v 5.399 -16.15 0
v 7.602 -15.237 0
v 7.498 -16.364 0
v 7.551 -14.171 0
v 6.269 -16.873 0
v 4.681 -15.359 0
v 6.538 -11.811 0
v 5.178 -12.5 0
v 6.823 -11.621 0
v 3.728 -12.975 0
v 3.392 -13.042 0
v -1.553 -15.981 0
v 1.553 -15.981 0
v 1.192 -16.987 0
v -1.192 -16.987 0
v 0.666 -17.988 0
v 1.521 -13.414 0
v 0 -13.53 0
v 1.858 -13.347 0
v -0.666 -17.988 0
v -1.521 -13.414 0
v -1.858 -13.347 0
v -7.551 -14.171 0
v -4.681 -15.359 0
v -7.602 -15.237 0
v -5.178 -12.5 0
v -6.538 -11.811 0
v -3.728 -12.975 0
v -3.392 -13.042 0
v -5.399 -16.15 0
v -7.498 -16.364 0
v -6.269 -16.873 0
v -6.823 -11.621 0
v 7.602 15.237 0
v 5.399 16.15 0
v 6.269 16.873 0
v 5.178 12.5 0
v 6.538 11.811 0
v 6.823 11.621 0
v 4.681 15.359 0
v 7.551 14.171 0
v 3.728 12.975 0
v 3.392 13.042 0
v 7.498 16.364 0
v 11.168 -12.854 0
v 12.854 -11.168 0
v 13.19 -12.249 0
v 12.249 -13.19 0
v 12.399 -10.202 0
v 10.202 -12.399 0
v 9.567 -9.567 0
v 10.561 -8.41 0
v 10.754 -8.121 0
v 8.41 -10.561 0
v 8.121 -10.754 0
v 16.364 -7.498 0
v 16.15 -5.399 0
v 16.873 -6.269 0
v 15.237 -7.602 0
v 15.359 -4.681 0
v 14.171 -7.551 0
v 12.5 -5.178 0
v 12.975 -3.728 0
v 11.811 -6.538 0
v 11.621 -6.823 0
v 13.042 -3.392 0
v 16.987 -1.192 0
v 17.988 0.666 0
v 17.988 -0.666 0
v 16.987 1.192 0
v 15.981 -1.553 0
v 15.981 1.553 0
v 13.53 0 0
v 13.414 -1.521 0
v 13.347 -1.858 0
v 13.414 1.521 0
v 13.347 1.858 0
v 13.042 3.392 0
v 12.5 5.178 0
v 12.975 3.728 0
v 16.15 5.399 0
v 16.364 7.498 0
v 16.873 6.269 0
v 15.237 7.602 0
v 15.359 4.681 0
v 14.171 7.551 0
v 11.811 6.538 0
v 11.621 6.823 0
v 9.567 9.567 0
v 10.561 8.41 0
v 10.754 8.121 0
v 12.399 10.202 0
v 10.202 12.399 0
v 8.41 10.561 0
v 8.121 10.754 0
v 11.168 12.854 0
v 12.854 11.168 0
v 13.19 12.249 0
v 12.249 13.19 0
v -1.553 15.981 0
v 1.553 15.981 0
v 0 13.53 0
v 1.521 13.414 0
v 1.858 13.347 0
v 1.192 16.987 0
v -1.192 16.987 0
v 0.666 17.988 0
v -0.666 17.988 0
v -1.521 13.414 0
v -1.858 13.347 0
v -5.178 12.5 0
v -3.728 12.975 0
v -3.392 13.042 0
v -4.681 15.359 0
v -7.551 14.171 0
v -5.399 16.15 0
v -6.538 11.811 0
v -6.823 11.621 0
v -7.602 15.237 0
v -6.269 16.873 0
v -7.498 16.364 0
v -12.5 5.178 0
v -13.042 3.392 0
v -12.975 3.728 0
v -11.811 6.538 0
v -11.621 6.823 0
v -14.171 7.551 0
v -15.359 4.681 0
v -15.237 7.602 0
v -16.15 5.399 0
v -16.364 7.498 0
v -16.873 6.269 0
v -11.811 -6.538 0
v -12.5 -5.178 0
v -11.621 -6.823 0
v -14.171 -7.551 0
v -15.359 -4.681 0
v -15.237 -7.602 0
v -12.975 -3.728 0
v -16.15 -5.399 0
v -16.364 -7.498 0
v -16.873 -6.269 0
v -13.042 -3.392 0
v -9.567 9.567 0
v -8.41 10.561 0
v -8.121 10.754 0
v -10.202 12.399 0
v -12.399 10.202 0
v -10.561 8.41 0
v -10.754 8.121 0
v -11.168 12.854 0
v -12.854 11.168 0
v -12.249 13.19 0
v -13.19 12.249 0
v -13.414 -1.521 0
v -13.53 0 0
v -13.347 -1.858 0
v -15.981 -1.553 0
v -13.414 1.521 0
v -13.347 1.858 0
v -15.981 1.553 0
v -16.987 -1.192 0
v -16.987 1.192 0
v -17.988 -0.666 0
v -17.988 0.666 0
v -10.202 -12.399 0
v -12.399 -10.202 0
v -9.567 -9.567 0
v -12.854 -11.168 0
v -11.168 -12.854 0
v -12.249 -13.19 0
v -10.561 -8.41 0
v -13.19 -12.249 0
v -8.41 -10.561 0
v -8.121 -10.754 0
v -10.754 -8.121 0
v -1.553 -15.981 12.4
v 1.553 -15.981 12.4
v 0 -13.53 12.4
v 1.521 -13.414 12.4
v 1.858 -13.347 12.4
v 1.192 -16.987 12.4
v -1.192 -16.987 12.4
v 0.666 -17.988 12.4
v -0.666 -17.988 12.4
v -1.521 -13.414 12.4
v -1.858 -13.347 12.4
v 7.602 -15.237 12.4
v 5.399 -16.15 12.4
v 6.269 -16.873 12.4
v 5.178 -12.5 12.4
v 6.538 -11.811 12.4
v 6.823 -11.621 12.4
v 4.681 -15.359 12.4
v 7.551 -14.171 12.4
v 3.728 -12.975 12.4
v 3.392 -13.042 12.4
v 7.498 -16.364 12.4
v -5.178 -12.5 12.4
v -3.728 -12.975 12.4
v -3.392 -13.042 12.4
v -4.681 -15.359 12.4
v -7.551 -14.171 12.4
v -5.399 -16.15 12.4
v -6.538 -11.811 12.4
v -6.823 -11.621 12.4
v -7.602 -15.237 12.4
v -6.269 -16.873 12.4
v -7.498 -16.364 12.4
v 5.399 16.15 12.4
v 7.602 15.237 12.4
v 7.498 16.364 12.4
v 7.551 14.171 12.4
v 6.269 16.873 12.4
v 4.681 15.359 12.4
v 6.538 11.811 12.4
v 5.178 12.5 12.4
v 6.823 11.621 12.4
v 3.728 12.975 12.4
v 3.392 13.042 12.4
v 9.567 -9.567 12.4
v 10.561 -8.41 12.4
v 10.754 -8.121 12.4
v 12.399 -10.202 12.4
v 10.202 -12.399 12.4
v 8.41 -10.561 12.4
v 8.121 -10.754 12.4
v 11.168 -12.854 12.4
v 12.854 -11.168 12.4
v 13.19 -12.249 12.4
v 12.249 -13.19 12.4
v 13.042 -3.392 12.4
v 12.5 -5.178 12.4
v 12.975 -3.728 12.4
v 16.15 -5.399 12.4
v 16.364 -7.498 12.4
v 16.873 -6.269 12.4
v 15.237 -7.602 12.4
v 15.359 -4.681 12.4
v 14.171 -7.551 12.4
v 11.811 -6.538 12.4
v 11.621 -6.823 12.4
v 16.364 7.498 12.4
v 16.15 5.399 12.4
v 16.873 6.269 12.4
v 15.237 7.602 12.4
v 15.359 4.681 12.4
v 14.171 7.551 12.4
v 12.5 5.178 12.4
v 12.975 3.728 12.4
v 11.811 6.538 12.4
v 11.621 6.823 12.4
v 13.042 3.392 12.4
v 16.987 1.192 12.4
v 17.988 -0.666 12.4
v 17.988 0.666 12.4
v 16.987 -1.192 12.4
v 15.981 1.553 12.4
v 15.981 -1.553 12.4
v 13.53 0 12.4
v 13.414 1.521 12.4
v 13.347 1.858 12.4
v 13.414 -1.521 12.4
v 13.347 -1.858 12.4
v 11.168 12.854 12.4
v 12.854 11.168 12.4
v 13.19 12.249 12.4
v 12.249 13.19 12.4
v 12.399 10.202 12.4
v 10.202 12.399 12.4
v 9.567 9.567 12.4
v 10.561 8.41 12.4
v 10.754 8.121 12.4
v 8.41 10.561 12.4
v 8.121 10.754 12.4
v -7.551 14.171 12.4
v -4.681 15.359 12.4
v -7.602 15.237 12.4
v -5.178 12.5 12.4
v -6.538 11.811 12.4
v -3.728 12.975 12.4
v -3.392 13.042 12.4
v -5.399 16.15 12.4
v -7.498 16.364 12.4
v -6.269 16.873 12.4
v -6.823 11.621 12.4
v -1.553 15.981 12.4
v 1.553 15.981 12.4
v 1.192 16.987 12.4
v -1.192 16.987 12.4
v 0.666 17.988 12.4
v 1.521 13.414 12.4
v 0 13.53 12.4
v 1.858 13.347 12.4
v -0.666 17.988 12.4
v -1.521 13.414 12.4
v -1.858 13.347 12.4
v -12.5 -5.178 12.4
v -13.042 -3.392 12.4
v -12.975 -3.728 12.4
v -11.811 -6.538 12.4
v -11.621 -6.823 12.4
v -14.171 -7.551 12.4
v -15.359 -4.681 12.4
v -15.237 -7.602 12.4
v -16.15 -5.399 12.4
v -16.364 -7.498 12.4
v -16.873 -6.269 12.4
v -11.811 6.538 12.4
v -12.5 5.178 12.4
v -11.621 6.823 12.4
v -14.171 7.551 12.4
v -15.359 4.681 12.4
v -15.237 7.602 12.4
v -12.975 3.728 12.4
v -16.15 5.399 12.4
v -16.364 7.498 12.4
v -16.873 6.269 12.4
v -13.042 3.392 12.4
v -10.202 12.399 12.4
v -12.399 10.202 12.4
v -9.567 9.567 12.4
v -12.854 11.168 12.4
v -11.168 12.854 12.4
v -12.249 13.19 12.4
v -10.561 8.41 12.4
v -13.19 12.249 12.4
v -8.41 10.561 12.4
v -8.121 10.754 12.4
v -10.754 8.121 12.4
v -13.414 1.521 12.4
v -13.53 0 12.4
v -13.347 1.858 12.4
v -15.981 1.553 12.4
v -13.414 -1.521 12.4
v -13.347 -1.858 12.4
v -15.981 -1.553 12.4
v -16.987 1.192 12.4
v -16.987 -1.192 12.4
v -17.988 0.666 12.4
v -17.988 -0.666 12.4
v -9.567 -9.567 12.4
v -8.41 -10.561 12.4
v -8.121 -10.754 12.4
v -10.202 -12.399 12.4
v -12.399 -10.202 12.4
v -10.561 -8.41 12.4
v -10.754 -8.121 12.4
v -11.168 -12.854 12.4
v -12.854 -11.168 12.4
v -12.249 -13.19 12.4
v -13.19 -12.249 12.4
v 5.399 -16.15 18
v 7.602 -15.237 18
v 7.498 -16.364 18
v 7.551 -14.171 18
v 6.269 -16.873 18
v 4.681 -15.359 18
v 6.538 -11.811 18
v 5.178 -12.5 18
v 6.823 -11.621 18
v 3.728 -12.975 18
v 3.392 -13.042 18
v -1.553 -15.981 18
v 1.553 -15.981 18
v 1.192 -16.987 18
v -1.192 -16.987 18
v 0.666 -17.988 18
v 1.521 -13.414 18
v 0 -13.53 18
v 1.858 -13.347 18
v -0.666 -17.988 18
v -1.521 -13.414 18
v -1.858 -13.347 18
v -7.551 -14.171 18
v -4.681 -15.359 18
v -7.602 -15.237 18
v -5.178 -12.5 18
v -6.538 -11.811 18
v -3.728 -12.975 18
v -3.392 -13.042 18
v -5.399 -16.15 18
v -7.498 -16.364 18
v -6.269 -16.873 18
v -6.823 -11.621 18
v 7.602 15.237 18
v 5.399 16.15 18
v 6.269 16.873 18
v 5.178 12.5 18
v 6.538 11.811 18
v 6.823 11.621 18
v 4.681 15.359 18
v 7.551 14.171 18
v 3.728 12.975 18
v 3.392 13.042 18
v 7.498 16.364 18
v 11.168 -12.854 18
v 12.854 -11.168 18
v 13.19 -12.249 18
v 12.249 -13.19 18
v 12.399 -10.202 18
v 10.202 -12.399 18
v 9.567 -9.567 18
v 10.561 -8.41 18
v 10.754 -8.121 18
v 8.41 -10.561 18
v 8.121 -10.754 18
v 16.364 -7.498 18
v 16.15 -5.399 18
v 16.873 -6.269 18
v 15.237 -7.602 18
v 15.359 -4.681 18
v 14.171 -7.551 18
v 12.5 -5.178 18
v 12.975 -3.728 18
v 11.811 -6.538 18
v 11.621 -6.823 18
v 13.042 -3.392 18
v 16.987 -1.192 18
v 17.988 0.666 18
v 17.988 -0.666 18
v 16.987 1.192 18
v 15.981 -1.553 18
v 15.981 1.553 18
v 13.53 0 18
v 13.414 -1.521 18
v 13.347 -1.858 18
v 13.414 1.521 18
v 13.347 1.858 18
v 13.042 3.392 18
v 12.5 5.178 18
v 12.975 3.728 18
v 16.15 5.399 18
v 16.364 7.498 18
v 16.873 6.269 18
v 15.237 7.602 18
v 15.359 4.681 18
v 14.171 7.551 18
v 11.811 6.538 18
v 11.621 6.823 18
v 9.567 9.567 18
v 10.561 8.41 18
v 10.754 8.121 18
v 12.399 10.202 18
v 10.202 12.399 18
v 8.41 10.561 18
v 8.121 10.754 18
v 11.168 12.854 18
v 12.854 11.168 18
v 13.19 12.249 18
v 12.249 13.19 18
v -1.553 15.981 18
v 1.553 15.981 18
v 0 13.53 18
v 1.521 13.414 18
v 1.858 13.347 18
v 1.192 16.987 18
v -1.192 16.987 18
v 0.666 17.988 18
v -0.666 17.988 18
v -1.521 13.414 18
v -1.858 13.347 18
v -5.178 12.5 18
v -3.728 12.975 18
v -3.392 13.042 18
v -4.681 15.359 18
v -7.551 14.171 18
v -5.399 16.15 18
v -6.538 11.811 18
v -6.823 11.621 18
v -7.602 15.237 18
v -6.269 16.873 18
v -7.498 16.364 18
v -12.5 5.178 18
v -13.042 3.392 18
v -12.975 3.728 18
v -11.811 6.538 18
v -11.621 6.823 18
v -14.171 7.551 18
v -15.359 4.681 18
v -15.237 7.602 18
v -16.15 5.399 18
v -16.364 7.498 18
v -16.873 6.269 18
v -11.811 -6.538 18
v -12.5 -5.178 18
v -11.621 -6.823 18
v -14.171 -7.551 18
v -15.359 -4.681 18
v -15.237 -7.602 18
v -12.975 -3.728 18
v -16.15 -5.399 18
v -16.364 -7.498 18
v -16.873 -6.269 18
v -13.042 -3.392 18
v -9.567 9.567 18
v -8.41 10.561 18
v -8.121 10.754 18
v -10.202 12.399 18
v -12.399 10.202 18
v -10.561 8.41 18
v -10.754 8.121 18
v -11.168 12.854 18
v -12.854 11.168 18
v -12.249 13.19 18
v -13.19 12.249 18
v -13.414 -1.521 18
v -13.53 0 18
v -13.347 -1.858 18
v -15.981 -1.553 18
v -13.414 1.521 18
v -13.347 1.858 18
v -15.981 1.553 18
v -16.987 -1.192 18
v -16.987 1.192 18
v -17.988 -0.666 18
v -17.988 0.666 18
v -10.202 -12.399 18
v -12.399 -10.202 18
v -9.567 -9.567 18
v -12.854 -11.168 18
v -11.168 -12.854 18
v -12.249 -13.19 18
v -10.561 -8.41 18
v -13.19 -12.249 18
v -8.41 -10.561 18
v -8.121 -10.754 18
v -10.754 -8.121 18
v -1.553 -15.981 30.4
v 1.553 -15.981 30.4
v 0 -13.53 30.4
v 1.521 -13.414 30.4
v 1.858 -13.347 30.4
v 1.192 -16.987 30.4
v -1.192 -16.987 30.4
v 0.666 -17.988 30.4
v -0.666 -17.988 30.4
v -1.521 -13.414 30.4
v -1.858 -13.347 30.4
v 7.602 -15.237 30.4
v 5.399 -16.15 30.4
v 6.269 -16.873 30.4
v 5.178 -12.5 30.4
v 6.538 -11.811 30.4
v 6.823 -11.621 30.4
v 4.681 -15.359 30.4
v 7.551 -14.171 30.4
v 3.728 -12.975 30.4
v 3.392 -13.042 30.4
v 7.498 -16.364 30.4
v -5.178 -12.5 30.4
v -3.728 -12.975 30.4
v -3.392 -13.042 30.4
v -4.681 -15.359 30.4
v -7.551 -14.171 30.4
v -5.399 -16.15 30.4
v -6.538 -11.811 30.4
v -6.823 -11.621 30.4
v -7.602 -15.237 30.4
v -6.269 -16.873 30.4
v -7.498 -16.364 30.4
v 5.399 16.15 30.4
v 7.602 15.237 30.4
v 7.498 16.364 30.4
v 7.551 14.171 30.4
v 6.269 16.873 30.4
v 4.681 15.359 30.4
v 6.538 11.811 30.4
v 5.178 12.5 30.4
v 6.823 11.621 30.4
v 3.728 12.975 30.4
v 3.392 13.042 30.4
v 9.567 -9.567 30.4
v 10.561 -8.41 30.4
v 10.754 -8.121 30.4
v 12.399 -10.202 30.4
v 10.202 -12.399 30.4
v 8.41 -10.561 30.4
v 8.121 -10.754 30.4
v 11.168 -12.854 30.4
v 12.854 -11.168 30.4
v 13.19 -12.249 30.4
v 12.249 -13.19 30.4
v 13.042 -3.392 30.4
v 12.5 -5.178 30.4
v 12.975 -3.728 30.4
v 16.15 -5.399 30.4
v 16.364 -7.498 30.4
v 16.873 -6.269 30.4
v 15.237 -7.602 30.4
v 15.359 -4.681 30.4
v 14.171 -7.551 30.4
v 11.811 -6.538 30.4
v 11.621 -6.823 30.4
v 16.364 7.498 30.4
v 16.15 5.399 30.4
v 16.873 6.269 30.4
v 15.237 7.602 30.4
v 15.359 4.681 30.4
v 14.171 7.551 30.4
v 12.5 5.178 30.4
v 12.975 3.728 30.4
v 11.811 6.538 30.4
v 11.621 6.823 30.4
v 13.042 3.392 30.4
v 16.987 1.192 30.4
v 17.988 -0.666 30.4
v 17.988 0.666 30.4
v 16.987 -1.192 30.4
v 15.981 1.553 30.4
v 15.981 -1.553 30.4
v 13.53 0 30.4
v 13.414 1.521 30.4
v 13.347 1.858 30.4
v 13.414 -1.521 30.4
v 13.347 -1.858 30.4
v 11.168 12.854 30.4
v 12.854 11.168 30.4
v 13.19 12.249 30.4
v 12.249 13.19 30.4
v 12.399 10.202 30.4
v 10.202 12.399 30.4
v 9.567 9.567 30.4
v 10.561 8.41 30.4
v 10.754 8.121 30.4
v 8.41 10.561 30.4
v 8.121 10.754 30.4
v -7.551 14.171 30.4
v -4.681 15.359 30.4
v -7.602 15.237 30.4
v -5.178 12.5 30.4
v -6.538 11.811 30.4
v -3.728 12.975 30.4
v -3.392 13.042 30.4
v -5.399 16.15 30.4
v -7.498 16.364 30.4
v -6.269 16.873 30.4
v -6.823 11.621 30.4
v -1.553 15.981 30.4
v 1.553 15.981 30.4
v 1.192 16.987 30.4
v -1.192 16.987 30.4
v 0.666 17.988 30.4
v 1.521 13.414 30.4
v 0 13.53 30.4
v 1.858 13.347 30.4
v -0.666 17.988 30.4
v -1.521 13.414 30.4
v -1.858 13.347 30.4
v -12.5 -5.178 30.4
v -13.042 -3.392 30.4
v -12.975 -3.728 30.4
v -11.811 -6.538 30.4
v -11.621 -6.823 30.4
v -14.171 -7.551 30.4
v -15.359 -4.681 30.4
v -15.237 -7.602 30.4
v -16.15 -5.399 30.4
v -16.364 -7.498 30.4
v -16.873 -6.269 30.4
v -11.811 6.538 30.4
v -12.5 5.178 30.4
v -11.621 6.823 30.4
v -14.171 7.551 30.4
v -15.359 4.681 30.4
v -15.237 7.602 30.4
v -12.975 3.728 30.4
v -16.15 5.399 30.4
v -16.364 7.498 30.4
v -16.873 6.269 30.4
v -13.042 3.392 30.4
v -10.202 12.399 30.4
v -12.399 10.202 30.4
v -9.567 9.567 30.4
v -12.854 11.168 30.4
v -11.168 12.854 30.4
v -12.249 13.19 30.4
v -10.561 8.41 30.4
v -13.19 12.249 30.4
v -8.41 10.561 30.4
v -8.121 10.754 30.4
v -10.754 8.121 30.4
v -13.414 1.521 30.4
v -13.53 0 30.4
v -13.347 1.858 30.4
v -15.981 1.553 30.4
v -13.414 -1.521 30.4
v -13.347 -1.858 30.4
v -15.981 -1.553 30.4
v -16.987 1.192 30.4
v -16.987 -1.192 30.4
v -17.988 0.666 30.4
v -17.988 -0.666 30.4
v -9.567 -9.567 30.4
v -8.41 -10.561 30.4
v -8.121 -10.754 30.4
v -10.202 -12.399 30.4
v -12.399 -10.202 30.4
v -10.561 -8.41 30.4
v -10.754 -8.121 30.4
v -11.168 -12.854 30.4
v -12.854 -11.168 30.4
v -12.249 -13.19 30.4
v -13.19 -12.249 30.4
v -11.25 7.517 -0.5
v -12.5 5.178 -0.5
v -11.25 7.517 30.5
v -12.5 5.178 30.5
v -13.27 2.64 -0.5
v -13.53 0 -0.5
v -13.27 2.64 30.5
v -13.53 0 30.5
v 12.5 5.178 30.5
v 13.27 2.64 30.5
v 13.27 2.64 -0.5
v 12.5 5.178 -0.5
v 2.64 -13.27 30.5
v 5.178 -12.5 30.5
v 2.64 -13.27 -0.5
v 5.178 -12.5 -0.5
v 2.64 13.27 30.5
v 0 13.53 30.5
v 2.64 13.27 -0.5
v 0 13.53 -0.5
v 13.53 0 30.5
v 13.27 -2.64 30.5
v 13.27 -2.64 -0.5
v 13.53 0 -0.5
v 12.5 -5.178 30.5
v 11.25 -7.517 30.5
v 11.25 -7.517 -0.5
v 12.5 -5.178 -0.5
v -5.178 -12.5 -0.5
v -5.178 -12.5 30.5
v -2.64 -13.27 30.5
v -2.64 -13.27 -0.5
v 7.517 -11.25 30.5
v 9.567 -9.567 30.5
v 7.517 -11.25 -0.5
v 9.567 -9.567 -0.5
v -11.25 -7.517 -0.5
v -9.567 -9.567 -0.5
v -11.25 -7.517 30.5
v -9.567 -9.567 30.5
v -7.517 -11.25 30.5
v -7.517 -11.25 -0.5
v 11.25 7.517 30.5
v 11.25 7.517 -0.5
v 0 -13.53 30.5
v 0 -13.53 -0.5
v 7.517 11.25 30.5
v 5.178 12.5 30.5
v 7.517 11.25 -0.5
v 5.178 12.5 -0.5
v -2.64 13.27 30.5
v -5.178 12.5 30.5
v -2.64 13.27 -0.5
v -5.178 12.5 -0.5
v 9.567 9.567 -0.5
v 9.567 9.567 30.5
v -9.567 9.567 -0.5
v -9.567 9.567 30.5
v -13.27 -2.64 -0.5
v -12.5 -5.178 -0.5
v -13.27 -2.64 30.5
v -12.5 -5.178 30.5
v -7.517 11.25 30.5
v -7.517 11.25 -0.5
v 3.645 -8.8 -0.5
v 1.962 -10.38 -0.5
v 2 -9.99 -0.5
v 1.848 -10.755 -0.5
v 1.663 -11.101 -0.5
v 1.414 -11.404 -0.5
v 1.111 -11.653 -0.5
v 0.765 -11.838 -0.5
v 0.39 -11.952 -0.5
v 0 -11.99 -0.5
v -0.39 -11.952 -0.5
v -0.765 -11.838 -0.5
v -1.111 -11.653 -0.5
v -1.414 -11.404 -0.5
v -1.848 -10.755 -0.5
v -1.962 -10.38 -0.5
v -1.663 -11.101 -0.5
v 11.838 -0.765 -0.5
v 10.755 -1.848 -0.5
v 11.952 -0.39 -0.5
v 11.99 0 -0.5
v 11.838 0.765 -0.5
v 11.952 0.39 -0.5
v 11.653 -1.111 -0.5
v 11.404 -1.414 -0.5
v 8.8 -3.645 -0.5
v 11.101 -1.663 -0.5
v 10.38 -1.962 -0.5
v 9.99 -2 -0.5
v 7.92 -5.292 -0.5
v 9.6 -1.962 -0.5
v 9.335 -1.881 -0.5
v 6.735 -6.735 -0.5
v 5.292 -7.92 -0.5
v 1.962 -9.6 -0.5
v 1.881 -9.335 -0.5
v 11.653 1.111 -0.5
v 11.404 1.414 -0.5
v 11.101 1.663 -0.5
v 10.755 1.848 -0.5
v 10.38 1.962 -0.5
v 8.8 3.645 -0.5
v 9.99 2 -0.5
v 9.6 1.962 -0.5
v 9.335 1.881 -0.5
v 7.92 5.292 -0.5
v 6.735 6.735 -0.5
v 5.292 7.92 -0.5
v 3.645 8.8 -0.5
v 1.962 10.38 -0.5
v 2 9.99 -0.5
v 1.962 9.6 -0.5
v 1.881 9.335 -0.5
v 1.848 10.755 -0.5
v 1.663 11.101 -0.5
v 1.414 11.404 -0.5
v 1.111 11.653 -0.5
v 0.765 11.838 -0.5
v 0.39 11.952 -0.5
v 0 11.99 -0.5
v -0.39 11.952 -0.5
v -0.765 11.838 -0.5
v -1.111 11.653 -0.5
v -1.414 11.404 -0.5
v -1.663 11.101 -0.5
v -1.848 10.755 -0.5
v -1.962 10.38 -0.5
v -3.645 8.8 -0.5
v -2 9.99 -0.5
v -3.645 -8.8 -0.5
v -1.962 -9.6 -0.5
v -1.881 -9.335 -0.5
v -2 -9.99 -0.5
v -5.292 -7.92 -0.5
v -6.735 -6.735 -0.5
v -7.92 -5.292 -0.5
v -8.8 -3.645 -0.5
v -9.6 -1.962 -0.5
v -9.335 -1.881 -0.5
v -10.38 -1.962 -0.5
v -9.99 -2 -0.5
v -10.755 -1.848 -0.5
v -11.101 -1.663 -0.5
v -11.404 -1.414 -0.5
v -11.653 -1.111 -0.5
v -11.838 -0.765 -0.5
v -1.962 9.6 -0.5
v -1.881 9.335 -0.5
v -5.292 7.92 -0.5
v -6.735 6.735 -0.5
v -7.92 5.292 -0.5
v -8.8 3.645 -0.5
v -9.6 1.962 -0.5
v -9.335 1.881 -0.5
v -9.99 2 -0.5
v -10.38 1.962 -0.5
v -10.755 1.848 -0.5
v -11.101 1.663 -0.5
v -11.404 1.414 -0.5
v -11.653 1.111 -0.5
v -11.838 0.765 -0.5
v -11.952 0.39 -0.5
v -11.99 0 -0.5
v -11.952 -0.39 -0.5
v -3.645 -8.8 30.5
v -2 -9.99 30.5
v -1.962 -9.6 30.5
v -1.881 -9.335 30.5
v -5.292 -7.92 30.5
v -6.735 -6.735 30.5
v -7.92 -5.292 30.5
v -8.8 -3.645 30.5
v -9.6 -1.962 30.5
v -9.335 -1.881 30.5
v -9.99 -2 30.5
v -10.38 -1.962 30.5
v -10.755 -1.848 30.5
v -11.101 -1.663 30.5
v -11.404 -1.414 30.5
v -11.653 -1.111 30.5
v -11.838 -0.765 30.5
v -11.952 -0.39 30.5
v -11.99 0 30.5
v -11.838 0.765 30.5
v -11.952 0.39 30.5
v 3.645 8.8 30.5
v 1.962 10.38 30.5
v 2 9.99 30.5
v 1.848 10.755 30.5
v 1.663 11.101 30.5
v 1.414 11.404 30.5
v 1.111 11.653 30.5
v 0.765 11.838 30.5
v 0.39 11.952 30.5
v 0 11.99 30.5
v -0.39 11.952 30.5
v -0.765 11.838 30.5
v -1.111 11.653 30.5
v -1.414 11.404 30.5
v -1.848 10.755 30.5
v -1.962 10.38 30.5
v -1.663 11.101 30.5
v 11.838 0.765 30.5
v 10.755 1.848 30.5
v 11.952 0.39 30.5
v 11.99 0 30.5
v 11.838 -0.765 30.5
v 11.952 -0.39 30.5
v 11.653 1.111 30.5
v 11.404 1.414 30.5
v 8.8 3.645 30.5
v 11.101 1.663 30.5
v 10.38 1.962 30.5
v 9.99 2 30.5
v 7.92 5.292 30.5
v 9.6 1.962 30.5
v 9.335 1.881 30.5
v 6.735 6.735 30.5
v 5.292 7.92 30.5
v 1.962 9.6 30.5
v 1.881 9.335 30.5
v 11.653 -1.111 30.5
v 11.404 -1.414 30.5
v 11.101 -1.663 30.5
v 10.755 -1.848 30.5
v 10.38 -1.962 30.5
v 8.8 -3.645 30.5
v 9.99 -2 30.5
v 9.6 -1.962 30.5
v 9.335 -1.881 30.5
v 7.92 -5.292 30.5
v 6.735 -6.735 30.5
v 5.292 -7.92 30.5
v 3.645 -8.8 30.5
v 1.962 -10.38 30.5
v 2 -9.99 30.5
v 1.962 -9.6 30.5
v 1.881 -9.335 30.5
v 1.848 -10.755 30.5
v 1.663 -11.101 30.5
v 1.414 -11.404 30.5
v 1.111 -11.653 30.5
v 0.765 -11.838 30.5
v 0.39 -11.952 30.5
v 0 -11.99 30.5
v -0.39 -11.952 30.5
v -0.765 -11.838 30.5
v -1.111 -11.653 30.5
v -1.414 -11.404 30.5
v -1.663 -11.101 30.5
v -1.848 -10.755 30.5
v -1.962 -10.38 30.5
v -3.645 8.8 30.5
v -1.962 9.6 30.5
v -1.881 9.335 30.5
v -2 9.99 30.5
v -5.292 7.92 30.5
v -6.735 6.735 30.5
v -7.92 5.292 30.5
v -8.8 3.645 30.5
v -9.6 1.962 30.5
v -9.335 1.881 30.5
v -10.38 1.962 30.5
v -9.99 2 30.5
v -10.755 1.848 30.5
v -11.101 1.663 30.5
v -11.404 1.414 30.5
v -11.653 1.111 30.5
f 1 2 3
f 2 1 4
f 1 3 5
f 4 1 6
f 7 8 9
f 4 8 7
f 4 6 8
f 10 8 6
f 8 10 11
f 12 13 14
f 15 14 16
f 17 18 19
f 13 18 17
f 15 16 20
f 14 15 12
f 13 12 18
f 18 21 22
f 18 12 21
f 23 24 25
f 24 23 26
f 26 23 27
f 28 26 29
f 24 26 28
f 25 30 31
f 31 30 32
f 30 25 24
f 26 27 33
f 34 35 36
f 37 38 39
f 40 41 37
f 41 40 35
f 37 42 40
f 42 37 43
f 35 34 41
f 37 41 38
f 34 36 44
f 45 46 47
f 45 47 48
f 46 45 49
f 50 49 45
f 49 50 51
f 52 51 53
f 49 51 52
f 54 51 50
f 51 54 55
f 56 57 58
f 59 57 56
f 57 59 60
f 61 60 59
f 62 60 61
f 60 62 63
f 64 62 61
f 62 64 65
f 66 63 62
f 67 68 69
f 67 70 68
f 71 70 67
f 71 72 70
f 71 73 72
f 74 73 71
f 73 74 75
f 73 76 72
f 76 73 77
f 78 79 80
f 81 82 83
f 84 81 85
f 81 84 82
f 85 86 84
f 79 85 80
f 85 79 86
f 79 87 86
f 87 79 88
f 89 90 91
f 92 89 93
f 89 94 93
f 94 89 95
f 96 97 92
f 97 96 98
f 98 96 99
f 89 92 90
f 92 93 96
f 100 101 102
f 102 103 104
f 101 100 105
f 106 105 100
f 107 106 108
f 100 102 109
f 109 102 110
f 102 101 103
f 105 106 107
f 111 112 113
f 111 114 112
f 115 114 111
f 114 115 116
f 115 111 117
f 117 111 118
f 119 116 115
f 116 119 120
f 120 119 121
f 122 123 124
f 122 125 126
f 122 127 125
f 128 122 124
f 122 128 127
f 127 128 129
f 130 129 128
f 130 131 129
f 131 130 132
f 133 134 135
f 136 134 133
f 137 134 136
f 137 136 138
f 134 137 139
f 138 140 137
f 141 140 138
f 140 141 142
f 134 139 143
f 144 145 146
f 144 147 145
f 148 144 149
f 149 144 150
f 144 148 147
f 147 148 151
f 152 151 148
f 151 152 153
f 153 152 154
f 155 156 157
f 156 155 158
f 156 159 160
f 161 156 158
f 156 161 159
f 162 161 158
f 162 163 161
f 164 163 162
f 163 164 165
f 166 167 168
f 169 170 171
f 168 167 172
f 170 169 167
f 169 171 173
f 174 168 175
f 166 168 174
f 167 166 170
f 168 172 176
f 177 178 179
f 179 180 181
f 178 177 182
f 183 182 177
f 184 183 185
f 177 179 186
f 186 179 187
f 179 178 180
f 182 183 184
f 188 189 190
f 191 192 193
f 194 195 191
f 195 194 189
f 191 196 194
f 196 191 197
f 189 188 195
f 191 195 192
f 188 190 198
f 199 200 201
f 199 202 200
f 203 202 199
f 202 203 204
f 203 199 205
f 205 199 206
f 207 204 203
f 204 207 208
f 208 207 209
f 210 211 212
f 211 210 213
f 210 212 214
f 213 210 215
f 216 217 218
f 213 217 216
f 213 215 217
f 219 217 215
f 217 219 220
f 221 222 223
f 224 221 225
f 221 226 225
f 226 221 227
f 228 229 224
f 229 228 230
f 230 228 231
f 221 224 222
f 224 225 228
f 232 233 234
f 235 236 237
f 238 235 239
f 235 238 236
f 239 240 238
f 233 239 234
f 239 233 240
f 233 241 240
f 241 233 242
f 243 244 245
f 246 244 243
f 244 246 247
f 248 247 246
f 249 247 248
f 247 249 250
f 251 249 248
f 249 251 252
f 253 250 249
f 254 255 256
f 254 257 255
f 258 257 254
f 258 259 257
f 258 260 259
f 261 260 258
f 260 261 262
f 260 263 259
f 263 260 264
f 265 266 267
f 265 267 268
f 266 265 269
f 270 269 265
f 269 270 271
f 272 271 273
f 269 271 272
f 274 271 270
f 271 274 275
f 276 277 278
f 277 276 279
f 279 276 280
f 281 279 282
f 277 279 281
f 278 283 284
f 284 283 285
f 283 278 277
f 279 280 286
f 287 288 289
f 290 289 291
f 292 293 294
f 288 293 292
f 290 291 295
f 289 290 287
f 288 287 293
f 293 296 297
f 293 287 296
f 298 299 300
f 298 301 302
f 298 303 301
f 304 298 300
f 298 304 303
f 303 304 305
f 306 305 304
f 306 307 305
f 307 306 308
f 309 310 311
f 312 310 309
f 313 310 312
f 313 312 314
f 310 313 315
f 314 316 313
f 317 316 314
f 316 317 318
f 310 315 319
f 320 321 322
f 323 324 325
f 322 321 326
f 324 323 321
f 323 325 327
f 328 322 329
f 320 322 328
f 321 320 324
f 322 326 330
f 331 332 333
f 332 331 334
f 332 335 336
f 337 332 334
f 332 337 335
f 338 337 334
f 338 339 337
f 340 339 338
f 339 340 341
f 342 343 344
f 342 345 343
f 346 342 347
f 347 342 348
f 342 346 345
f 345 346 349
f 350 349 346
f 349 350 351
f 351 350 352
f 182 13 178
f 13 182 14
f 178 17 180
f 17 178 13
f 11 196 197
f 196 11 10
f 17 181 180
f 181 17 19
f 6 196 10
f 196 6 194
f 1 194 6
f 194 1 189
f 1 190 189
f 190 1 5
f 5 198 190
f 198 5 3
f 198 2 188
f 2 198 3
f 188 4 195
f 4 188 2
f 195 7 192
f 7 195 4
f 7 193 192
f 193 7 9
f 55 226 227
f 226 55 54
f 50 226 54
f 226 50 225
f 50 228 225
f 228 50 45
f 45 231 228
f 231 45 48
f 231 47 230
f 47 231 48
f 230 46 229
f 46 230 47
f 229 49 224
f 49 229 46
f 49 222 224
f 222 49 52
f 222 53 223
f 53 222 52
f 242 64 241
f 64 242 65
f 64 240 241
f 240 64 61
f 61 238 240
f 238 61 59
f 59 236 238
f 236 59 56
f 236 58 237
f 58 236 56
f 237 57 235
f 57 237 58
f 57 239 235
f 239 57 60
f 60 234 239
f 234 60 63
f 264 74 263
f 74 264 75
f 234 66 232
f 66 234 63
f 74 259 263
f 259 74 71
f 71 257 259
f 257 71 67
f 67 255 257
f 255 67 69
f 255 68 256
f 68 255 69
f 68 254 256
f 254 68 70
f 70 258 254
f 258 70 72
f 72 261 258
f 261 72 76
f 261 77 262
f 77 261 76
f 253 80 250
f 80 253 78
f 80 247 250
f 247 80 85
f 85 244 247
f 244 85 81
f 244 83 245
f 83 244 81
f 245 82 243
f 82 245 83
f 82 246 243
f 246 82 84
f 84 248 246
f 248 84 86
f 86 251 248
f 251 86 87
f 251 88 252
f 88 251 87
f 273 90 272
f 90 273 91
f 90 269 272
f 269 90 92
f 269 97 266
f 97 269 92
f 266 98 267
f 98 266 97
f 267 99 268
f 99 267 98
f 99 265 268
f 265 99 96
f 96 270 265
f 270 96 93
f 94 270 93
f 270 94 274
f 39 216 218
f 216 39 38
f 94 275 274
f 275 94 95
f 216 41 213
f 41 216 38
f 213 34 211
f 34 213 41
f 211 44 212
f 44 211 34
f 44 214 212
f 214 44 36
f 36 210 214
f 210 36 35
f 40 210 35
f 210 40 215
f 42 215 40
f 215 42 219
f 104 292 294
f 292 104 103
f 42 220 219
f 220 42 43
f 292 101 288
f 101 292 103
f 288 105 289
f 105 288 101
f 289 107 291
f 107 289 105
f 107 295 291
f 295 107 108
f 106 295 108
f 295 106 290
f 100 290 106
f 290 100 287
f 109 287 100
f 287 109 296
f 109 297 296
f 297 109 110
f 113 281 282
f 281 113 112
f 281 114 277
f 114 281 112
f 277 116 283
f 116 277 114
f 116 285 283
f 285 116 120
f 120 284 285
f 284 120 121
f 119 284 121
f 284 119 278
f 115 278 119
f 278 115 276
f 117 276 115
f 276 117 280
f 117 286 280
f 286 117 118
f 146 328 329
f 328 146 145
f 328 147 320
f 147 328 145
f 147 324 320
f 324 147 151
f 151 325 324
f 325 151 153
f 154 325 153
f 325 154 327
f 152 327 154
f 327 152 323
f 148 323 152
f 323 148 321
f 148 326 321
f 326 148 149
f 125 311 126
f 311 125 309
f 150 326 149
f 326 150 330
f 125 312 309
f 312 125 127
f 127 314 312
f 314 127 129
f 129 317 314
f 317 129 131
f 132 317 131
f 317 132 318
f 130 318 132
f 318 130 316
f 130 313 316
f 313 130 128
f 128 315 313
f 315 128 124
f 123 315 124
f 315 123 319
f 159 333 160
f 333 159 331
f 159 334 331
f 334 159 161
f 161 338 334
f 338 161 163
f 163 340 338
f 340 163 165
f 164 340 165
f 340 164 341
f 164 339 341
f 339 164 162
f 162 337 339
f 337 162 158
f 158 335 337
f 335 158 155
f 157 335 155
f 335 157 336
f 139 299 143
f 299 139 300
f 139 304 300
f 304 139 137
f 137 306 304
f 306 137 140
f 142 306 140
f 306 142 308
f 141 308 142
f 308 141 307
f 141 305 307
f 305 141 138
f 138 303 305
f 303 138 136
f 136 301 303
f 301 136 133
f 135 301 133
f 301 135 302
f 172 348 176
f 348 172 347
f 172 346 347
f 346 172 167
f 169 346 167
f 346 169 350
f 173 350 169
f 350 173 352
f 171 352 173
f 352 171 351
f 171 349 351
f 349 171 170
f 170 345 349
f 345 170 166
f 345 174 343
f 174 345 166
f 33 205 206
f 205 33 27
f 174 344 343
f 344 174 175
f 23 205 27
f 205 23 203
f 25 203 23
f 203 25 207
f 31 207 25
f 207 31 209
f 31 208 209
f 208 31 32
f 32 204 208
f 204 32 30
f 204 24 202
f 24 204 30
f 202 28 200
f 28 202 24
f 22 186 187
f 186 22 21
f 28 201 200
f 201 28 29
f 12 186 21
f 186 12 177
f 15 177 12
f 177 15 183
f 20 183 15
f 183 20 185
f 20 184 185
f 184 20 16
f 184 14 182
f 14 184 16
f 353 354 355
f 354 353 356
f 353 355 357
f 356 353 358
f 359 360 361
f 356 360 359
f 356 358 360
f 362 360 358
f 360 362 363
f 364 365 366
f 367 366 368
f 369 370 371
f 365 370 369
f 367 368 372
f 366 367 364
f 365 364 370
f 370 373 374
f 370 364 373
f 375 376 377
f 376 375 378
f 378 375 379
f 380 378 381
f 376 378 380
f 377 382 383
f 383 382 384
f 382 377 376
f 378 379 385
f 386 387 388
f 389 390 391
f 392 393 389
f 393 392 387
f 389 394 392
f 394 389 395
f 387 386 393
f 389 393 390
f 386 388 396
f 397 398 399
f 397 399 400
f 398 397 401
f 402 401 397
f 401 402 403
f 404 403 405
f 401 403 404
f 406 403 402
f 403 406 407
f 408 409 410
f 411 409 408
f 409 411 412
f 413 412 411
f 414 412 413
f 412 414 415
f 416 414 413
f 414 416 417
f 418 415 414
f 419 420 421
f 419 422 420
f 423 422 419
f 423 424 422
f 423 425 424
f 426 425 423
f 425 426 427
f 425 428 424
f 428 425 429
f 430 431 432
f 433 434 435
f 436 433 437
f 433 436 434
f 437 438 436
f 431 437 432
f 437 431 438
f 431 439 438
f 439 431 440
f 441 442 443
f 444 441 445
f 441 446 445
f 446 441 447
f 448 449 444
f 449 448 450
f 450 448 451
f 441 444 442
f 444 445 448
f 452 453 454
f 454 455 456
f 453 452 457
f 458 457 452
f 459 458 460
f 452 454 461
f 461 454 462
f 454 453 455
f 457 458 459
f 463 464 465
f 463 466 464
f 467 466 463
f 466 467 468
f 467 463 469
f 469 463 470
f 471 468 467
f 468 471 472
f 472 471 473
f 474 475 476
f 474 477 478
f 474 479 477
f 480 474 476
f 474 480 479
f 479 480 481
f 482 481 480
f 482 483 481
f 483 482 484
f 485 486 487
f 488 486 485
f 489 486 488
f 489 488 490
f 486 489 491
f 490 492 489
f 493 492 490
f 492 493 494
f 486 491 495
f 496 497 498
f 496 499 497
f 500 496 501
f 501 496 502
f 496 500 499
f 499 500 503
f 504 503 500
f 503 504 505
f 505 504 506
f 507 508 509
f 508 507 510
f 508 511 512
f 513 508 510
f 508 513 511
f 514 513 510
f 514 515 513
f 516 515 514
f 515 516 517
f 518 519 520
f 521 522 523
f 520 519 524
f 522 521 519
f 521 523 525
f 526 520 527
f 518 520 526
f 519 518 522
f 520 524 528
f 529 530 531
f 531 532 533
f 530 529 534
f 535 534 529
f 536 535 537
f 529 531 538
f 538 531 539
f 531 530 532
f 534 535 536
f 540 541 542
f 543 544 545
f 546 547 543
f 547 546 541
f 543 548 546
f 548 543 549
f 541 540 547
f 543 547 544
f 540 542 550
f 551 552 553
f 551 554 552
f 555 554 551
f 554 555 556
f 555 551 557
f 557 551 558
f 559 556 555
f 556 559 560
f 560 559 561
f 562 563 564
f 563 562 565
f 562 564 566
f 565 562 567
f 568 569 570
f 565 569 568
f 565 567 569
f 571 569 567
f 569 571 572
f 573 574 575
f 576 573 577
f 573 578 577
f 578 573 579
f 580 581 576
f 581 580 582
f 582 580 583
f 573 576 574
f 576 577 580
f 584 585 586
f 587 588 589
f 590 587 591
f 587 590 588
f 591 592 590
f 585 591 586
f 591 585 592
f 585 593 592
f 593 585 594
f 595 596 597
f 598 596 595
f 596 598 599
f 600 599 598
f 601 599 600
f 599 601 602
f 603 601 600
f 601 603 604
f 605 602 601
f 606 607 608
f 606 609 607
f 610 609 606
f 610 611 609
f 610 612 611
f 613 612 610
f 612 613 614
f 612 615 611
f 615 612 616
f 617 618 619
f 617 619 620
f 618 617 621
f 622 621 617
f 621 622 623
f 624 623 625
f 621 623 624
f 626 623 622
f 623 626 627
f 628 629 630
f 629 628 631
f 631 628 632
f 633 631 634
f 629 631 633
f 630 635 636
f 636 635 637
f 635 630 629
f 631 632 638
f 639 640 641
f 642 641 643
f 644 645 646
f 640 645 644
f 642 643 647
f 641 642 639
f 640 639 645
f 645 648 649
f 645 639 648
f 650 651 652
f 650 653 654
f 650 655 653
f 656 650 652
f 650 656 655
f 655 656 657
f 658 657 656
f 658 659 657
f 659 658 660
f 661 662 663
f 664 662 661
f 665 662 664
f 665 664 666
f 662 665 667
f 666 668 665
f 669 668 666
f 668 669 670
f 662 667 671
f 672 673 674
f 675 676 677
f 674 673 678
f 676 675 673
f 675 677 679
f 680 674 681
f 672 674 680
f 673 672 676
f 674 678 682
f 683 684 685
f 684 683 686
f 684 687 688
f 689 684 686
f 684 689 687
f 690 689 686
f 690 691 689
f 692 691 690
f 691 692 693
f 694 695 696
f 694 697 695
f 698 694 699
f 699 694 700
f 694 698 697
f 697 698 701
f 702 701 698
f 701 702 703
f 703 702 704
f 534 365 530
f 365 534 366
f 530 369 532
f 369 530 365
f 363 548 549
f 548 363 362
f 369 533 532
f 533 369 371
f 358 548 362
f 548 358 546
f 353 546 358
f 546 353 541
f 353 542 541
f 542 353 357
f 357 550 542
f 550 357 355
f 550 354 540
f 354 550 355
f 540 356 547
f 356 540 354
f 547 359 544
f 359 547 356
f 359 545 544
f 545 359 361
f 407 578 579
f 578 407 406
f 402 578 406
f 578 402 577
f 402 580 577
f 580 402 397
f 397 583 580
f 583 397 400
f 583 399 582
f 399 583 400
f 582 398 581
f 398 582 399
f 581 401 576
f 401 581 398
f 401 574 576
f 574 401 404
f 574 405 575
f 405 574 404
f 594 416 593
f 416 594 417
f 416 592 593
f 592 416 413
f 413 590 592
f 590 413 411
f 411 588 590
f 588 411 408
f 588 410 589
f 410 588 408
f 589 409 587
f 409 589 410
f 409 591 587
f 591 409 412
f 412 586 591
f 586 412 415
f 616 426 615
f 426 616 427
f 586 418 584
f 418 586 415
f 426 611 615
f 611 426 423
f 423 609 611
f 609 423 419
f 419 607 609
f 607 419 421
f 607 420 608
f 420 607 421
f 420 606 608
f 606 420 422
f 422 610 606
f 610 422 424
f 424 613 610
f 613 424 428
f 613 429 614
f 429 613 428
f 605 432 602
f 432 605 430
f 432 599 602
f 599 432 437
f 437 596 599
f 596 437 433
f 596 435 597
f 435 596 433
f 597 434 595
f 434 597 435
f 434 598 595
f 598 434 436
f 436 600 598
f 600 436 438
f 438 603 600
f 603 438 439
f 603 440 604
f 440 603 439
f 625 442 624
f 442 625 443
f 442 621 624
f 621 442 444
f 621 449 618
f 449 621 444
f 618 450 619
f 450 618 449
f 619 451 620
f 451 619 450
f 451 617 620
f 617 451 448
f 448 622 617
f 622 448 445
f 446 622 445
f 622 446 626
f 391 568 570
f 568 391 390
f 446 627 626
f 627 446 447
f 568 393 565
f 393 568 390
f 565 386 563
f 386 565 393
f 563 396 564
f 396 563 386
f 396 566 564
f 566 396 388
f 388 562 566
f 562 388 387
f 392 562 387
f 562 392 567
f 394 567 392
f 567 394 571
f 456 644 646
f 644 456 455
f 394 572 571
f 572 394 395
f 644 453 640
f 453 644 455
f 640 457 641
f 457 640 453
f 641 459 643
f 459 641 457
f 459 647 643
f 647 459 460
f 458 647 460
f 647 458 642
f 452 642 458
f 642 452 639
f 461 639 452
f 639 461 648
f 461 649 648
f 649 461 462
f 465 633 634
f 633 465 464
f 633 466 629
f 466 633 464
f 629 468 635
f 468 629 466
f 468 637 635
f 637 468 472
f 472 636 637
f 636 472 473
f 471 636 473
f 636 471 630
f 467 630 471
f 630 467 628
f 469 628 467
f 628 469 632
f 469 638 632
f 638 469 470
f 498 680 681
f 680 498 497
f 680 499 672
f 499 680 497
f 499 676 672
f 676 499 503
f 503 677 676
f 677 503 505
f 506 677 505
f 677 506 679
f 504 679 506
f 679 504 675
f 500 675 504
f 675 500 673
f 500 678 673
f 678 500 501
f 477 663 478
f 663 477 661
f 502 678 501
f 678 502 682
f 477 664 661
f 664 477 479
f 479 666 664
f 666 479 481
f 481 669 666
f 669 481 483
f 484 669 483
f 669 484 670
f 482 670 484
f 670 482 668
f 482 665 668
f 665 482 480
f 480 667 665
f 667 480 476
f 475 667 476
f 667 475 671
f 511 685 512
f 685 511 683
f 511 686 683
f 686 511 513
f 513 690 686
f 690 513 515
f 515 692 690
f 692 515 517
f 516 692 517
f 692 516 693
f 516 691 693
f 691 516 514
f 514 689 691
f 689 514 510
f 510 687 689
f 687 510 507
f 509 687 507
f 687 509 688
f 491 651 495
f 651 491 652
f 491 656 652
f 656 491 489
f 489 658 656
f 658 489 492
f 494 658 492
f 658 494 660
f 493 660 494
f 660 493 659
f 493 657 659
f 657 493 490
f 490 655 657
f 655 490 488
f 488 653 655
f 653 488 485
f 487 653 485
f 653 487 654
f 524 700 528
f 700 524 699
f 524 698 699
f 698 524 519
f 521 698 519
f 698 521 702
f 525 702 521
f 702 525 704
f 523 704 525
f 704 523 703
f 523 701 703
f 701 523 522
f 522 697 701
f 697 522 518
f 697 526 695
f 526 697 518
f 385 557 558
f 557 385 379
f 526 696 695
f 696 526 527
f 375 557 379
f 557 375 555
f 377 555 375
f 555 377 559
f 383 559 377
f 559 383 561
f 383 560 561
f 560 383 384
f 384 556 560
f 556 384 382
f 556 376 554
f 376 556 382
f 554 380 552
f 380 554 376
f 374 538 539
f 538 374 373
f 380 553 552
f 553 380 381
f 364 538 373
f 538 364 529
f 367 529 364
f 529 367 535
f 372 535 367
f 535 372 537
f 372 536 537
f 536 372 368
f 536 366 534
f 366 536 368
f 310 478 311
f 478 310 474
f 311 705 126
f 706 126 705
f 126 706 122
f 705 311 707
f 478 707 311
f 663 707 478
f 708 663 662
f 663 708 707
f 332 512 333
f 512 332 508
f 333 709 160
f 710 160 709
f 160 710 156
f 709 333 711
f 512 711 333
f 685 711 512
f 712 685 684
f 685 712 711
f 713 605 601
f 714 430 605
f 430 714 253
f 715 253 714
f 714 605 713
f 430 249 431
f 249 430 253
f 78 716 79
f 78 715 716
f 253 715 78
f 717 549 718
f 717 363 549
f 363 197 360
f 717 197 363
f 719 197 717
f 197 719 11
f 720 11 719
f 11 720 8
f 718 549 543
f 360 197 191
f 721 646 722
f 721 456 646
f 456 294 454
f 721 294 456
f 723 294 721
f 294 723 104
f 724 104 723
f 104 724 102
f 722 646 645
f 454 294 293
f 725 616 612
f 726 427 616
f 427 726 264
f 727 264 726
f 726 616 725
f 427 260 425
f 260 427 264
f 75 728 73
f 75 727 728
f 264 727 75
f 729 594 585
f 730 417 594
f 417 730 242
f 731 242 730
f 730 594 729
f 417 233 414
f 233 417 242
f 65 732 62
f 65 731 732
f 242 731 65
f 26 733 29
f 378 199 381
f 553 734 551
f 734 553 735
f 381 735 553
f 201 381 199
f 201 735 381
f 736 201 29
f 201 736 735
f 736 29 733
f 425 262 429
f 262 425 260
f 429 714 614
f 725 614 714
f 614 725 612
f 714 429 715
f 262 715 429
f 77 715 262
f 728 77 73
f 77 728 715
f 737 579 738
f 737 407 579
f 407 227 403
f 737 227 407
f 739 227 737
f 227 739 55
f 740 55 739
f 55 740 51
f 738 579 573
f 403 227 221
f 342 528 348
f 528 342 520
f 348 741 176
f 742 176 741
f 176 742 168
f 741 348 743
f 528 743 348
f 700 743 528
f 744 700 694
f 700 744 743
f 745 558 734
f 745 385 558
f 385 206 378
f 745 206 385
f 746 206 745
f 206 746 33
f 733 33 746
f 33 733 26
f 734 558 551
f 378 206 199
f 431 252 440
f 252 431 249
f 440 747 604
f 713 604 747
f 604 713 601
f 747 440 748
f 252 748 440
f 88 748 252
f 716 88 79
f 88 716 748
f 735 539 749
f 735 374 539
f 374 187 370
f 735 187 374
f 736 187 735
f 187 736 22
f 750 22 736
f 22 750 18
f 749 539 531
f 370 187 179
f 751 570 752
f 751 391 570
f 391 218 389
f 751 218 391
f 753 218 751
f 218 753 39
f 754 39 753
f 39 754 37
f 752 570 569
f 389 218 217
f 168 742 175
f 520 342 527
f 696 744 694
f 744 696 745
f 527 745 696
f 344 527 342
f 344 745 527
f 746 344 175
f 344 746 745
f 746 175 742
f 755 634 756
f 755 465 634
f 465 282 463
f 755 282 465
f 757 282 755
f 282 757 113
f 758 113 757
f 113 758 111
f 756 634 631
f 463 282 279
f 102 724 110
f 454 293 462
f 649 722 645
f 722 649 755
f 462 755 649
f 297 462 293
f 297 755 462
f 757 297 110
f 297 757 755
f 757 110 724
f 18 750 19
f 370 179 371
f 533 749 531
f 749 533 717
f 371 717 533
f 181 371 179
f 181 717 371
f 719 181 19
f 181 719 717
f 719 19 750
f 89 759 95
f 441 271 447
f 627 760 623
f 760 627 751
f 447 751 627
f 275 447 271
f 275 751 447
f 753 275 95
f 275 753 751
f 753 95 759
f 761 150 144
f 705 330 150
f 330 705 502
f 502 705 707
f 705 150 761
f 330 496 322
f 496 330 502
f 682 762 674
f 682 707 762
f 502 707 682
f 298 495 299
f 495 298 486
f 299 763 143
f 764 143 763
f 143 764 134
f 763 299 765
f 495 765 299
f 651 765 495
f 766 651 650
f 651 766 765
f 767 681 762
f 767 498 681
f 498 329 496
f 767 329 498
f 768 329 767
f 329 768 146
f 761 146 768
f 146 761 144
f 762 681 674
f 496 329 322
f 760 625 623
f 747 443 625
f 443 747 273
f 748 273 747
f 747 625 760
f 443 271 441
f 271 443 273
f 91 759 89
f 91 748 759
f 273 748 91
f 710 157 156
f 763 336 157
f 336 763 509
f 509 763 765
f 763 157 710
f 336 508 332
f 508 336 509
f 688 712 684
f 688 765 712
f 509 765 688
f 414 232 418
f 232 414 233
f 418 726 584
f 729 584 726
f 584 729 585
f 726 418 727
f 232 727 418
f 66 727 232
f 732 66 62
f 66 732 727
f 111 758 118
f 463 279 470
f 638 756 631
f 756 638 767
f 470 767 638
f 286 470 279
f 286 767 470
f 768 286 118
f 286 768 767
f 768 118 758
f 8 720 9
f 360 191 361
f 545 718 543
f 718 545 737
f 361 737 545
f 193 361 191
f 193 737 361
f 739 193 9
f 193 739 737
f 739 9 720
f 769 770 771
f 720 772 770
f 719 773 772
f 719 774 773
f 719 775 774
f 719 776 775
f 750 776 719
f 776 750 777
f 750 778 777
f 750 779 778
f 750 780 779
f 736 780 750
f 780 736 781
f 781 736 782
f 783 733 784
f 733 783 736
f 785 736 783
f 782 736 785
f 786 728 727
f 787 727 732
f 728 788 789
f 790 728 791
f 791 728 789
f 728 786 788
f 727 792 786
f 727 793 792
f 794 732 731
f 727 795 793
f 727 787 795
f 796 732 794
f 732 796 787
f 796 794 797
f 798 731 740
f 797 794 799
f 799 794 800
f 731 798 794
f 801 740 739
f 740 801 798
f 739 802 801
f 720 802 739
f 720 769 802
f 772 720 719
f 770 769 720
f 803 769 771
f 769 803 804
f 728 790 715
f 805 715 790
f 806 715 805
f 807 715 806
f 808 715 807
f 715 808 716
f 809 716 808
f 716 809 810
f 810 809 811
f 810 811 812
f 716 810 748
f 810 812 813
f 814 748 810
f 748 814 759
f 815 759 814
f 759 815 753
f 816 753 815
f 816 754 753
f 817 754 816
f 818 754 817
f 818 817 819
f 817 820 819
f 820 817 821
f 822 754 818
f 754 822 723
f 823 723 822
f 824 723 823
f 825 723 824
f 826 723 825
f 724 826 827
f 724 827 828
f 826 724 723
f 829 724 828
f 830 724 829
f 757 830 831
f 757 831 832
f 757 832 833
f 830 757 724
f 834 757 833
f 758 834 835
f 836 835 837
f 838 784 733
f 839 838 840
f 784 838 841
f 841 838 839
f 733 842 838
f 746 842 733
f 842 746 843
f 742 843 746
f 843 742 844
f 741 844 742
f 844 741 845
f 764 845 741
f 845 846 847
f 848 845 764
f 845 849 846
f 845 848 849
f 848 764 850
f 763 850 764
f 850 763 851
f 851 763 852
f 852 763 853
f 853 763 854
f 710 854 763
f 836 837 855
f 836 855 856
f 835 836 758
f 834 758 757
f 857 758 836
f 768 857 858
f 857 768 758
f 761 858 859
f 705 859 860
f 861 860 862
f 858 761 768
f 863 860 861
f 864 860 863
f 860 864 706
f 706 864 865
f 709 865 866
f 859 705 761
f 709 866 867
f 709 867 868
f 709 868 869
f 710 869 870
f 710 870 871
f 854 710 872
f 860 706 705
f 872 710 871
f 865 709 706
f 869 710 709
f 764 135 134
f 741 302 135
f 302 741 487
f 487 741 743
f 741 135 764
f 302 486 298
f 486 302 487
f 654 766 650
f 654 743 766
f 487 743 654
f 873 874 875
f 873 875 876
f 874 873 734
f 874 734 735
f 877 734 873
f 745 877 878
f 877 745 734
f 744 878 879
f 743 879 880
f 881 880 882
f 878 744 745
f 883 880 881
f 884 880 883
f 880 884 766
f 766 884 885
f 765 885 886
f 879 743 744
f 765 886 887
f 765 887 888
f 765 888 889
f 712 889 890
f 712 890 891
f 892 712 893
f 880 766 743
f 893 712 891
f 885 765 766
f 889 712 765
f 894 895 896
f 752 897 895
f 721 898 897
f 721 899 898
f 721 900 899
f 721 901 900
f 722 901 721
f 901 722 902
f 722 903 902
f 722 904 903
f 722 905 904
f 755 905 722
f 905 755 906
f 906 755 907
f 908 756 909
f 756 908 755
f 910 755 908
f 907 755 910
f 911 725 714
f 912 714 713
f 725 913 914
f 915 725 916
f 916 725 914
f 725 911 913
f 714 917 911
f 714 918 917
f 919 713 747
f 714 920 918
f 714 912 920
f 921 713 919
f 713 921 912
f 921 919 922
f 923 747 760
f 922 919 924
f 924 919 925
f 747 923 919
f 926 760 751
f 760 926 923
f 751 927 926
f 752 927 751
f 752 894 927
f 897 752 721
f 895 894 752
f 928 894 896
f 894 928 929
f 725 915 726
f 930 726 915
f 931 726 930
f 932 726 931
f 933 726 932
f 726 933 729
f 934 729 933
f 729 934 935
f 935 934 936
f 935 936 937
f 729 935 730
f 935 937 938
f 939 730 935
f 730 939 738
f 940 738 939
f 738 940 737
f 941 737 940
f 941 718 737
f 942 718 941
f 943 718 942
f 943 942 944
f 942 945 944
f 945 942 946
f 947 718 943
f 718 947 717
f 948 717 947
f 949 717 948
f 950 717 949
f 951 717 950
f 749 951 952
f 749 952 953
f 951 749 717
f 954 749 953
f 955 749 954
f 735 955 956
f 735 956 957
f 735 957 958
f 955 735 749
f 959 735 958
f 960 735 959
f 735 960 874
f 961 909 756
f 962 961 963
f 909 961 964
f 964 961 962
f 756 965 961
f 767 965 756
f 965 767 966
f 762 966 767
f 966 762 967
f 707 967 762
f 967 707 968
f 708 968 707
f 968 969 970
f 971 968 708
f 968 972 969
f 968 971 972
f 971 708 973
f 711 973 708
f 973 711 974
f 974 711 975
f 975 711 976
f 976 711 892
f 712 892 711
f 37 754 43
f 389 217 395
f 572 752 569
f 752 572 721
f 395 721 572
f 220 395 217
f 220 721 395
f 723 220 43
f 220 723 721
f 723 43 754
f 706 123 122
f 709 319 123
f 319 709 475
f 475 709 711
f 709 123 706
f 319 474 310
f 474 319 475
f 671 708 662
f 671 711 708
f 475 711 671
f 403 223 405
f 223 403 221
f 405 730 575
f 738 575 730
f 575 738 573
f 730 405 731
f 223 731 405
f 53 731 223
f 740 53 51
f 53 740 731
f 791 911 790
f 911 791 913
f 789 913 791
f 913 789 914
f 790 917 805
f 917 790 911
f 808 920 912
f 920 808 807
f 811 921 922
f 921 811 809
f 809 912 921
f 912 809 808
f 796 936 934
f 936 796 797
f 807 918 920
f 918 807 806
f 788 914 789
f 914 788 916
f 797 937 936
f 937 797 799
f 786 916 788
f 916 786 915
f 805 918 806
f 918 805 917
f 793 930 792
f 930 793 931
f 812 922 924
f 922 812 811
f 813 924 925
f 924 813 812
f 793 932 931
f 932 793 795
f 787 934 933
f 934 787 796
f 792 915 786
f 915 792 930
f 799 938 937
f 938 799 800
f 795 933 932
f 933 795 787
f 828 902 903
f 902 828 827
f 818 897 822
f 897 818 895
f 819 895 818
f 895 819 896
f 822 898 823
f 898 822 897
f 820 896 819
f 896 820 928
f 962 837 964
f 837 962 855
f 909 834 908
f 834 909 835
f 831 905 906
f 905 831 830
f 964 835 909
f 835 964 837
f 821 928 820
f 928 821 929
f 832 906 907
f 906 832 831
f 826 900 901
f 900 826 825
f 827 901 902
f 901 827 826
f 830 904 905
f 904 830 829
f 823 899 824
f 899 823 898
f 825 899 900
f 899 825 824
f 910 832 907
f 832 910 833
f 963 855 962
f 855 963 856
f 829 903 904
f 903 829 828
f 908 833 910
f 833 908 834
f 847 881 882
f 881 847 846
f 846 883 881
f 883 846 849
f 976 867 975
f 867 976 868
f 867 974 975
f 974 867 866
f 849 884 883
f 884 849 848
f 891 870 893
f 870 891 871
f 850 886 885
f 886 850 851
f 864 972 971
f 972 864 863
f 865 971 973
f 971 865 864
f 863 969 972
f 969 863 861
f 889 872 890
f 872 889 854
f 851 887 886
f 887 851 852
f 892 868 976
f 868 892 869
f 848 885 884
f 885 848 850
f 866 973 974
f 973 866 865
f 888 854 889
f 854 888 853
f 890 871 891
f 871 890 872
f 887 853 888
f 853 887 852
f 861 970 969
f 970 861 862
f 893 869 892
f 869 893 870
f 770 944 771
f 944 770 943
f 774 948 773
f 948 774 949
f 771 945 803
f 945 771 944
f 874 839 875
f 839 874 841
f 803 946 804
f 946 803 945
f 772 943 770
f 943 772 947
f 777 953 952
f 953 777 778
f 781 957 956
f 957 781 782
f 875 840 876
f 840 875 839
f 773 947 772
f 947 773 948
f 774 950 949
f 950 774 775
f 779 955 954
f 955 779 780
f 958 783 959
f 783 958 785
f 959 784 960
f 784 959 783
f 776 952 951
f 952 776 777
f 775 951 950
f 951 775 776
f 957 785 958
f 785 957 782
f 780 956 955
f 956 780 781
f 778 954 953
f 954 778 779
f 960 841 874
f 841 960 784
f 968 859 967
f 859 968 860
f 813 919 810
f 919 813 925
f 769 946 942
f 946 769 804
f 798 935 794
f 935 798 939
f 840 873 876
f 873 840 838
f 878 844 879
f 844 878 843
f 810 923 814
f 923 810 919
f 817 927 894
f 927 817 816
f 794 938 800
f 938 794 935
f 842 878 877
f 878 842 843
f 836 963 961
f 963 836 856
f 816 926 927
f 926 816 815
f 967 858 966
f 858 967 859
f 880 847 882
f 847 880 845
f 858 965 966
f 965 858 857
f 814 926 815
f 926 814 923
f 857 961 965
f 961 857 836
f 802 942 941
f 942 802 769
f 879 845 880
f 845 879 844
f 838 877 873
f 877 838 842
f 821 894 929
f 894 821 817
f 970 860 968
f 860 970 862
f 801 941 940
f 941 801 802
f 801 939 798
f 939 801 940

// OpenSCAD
$fn = 32;

// ----------------------------------------------------------------------
// Two-module gear rim: z16 m2 and z16 m2, 30 mm wide
// ----------------------------------------------------------------------

// --- parameters (mm) ---
module_a = 2;             // first tooth module
teeth_a = 16;             // first band tooth count
module_b = 2;             // second tooth module
teeth_b = 16;             // second band tooth count
band_h = 12;              // height of one tooth band
web_t = 6;                // web thickness between the bands
total = 30;               // overall width over both bands
root_r = 13.5;            // root radius of the coarse band
hub_r = 13.53;            // hub radius
bore_d = 19.05;           // hub bore
hole_count = 4;           // lightening holes
hole_r = 9.99;            // lightening hole circle radius
hole_d = 4;               // lightening hole diameter

band_a = [[13.414, -1.521], [15.981, -1.553], [16.987, -1.192], [17.988, -0.666], [17.988, 0.666], [16.987, 1.192], [15.981, 1.553], [13.414, 1.521], [12.975, 3.728], [15.359, 4.681], [16.15, 5.399], [16.873, 6.269], [16.364, 7.498], [15.237, 7.602], [14.171, 7.551], [11.811, 6.538], [10.561, 8.41], [12.399, 10.202], [12.854, 11.168], [13.19, 12.249], [12.249, 13.19], [11.168, 12.854], [10.202, 12.399], [8.41, 10.561], [6.538, 11.811], [7.551, 14.171], [7.602, 15.237], [7.498, 16.364], [6.269, 16.873], [5.399, 16.15], [4.681, 15.359], [3.728, 12.975], [1.521, 13.414], [1.553, 15.981], [1.192, 16.987], [0.666, 17.988], [-0.666, 17.988], [-1.192, 16.987], [-1.553, 15.981], [-1.521, 13.414], [-3.728, 12.975], [-4.681, 15.359], [-5.399, 16.15], [-6.269, 16.873], [-7.498, 16.364], [-7.602, 15.237], [-7.551, 14.171], [-6.538, 11.811], [-8.41, 10.561], [-10.202, 12.399], [-11.168, 12.854], [-12.249, 13.19], [-13.19, 12.249], [-12.854, 11.168], [-12.399, 10.202], [-10.561, 8.41], [-11.811, 6.538], [-14.171, 7.551], [-15.237, 7.602], [-16.364, 7.498], [-16.873, 6.269], [-16.15, 5.399], [-15.359, 4.681], [-12.975, 3.728], [-13.414, 1.521], [-15.981, 1.553], [-16.987, 1.192], [-17.988, 0.666], [-17.988, -0.666], [-16.987, -1.192], [-15.981, -1.553], [-13.414, -1.521], [-12.975, -3.728], [-15.359, -4.681], [-16.15, -5.399], [-16.873, -6.269], [-16.364, -7.498], [-15.237, -7.602], [-14.171, -7.551], [-11.811, -6.538], [-10.561, -8.41], [-12.399, -10.202], [-12.854, -11.168], [-13.19, -12.249], [-12.249, -13.19], [-11.168, -12.854], [-10.202, -12.399], [-8.41, -10.561], [-6.538, -11.811], [-7.551, -14.171], [-7.602, -15.237], [-7.498, -16.364], [-6.269, -16.873], [-5.399, -16.15], [-4.681, -15.359], [-3.728, -12.975], [-1.521, -13.414], [-1.553, -15.981], [-1.192, -16.987], [-0.666, -17.988], [0.666, -17.988], [1.192, -16.987], [1.553, -15.981], [1.521, -13.414], [3.728, -12.975], [4.681, -15.359], [5.399, -16.15], [6.269, -16.873], [7.498, -16.364], [7.602, -15.237], [7.551, -14.171], [6.538, -11.811], [8.41, -10.561], [10.202, -12.399], [11.168, -12.854], [12.249, -13.19], [13.19, -12.249], [12.854, -11.168], [12.399, -10.202], [10.561, -8.41], [11.811, -6.538], [14.171, -7.551], [15.237, -7.602], [16.364, -7.498], [16.873, -6.269], [16.15, -5.399], [15.359, -4.681], [12.975, -3.728]];
band_b = [[13.414, -1.521], [15.981, -1.553], [16.987, -1.192], [17.988, -0.666], [17.988, 0.666], [16.987, 1.192], [15.981, 1.553], [13.414, 1.521], [12.975, 3.728], [15.359, 4.681], [16.15, 5.399], [16.873, 6.269], [16.364, 7.498], [15.237, 7.602], [14.171, 7.551], [11.811, 6.538], [10.561, 8.41], [12.399, 10.202], [12.854, 11.168], [13.19, 12.249], [12.249, 13.19], [11.168, 12.854], [10.202, 12.399], [8.41, 10.561], [6.538, 11.811], [7.551, 14.171], [7.602, 15.237], [7.498, 16.364], [6.269, 16.873], [5.399, 16.15], [4.681, 15.359], [3.728, 12.975], [1.521, 13.414], [1.553, 15.981], [1.192, 16.987], [0.666, 17.988], [-0.666, 17.988], [-1.192, 16.987], [-1.553, 15.981], [-1.521, 13.414], [-3.728, 12.975], [-4.681, 15.359], [-5.399, 16.15], [-6.269, 16.873], [-7.498, 16.364], [-7.602, 15.237], [-7.551, 14.171], [-6.538, 11.811], [-8.41, 10.561], [-10.202, 12.399], [-11.168, 12.854], [-12.249, 13.19], [-13.19, 12.249], [-12.854, 11.168], [-12.399, 10.202], [-10.561, 8.41], [-11.811, 6.538], [-14.171, 7.551], [-15.237, 7.602], [-16.364, 7.498], [-16.873, 6.269], [-16.15, 5.399], [-15.359, 4.681], [-12.975, 3.728], [-13.414, 1.521], [-15.981, 1.553], [-16.987, 1.192], [-17.988, 0.666], [-17.988, -0.666], [-16.987, -1.192], [-15.981, -1.553], [-13.414, -1.521], [-12.975, -3.728], [-15.359, -4.681], [-16.15, -5.399], [-16.873, -6.269], [-16.364, -7.498], [-15.237, -7.602], [-14.171, -7.551], [-11.811, -6.538], [-10.561, -8.41], [-12.399, -10.202], [-12.854, -11.168], [-13.19, -12.249], [-12.249, -13.19], [-11.168, -12.854], [-10.202, -12.399], [-8.41, -10.561], [-6.538, -11.811], [-7.551, -14.171], [-7.602, -15.237], [-7.498, -16.364], [-6.269, -16.873], [-5.399, -16.15], [-4.681, -15.359], [-3.728, -12.975], [-1.521, -13.414], [-1.553, -15.981], [-1.192, -16.987], [-0.666, -17.988], [0.666, -17.988], [1.192, -16.987], [1.553, -15.981], [1.521, -13.414], [3.728, -12.975], [4.681, -15.359], [5.399, -16.15], [6.269, -16.873], [7.498, -16.364], [7.602, -15.237], [7.551, -14.171], [6.538, -11.811], [8.41, -10.561], [10.202, -12.399], [11.168, -12.854], [12.249, -13.19], [13.19, -12.249], [12.854, -11.168], [12.399, -10.202], [10.561, -8.41], [11.811, -6.538], [14.171, -7.551], [15.237, -7.602], [16.364, -7.498], [16.873, -6.269], [16.15, -5.399], [15.359, -4.681], [12.975, -3.728]];

difference() {
  union() {
    /* tooth band A, overlapping the web by 0.4 mm */
    linear_extrude(height = band_h + 0.4) polygon(band_a);
    /* web */
    translate([0, 0, band_h - 0.4]) cylinder(h = web_t + 0.8, d = 2 * root_r);
    /* tooth band B */
    translate([0, 0, band_h + web_t]) linear_extrude(height = band_h + 0.4) polygon(band_b);
    /* hub */
    translate([0, 0, -0.5]) cylinder(h = total + 1.0, d = 2 * hub_r);
  }
  /* bore */
  translate([0, 0, -2.5]) cylinder(h = total + 5, d = bore_d);
  /* lightening holes through the web */
  for (i = [0 : hole_count - 1]) {
    a = i * 360 / hole_count;
    translate([hole_r * cos(a), hole_r * sin(a), -2.5]) cylinder(h = total + 5, d = hole_d);
  }
}
